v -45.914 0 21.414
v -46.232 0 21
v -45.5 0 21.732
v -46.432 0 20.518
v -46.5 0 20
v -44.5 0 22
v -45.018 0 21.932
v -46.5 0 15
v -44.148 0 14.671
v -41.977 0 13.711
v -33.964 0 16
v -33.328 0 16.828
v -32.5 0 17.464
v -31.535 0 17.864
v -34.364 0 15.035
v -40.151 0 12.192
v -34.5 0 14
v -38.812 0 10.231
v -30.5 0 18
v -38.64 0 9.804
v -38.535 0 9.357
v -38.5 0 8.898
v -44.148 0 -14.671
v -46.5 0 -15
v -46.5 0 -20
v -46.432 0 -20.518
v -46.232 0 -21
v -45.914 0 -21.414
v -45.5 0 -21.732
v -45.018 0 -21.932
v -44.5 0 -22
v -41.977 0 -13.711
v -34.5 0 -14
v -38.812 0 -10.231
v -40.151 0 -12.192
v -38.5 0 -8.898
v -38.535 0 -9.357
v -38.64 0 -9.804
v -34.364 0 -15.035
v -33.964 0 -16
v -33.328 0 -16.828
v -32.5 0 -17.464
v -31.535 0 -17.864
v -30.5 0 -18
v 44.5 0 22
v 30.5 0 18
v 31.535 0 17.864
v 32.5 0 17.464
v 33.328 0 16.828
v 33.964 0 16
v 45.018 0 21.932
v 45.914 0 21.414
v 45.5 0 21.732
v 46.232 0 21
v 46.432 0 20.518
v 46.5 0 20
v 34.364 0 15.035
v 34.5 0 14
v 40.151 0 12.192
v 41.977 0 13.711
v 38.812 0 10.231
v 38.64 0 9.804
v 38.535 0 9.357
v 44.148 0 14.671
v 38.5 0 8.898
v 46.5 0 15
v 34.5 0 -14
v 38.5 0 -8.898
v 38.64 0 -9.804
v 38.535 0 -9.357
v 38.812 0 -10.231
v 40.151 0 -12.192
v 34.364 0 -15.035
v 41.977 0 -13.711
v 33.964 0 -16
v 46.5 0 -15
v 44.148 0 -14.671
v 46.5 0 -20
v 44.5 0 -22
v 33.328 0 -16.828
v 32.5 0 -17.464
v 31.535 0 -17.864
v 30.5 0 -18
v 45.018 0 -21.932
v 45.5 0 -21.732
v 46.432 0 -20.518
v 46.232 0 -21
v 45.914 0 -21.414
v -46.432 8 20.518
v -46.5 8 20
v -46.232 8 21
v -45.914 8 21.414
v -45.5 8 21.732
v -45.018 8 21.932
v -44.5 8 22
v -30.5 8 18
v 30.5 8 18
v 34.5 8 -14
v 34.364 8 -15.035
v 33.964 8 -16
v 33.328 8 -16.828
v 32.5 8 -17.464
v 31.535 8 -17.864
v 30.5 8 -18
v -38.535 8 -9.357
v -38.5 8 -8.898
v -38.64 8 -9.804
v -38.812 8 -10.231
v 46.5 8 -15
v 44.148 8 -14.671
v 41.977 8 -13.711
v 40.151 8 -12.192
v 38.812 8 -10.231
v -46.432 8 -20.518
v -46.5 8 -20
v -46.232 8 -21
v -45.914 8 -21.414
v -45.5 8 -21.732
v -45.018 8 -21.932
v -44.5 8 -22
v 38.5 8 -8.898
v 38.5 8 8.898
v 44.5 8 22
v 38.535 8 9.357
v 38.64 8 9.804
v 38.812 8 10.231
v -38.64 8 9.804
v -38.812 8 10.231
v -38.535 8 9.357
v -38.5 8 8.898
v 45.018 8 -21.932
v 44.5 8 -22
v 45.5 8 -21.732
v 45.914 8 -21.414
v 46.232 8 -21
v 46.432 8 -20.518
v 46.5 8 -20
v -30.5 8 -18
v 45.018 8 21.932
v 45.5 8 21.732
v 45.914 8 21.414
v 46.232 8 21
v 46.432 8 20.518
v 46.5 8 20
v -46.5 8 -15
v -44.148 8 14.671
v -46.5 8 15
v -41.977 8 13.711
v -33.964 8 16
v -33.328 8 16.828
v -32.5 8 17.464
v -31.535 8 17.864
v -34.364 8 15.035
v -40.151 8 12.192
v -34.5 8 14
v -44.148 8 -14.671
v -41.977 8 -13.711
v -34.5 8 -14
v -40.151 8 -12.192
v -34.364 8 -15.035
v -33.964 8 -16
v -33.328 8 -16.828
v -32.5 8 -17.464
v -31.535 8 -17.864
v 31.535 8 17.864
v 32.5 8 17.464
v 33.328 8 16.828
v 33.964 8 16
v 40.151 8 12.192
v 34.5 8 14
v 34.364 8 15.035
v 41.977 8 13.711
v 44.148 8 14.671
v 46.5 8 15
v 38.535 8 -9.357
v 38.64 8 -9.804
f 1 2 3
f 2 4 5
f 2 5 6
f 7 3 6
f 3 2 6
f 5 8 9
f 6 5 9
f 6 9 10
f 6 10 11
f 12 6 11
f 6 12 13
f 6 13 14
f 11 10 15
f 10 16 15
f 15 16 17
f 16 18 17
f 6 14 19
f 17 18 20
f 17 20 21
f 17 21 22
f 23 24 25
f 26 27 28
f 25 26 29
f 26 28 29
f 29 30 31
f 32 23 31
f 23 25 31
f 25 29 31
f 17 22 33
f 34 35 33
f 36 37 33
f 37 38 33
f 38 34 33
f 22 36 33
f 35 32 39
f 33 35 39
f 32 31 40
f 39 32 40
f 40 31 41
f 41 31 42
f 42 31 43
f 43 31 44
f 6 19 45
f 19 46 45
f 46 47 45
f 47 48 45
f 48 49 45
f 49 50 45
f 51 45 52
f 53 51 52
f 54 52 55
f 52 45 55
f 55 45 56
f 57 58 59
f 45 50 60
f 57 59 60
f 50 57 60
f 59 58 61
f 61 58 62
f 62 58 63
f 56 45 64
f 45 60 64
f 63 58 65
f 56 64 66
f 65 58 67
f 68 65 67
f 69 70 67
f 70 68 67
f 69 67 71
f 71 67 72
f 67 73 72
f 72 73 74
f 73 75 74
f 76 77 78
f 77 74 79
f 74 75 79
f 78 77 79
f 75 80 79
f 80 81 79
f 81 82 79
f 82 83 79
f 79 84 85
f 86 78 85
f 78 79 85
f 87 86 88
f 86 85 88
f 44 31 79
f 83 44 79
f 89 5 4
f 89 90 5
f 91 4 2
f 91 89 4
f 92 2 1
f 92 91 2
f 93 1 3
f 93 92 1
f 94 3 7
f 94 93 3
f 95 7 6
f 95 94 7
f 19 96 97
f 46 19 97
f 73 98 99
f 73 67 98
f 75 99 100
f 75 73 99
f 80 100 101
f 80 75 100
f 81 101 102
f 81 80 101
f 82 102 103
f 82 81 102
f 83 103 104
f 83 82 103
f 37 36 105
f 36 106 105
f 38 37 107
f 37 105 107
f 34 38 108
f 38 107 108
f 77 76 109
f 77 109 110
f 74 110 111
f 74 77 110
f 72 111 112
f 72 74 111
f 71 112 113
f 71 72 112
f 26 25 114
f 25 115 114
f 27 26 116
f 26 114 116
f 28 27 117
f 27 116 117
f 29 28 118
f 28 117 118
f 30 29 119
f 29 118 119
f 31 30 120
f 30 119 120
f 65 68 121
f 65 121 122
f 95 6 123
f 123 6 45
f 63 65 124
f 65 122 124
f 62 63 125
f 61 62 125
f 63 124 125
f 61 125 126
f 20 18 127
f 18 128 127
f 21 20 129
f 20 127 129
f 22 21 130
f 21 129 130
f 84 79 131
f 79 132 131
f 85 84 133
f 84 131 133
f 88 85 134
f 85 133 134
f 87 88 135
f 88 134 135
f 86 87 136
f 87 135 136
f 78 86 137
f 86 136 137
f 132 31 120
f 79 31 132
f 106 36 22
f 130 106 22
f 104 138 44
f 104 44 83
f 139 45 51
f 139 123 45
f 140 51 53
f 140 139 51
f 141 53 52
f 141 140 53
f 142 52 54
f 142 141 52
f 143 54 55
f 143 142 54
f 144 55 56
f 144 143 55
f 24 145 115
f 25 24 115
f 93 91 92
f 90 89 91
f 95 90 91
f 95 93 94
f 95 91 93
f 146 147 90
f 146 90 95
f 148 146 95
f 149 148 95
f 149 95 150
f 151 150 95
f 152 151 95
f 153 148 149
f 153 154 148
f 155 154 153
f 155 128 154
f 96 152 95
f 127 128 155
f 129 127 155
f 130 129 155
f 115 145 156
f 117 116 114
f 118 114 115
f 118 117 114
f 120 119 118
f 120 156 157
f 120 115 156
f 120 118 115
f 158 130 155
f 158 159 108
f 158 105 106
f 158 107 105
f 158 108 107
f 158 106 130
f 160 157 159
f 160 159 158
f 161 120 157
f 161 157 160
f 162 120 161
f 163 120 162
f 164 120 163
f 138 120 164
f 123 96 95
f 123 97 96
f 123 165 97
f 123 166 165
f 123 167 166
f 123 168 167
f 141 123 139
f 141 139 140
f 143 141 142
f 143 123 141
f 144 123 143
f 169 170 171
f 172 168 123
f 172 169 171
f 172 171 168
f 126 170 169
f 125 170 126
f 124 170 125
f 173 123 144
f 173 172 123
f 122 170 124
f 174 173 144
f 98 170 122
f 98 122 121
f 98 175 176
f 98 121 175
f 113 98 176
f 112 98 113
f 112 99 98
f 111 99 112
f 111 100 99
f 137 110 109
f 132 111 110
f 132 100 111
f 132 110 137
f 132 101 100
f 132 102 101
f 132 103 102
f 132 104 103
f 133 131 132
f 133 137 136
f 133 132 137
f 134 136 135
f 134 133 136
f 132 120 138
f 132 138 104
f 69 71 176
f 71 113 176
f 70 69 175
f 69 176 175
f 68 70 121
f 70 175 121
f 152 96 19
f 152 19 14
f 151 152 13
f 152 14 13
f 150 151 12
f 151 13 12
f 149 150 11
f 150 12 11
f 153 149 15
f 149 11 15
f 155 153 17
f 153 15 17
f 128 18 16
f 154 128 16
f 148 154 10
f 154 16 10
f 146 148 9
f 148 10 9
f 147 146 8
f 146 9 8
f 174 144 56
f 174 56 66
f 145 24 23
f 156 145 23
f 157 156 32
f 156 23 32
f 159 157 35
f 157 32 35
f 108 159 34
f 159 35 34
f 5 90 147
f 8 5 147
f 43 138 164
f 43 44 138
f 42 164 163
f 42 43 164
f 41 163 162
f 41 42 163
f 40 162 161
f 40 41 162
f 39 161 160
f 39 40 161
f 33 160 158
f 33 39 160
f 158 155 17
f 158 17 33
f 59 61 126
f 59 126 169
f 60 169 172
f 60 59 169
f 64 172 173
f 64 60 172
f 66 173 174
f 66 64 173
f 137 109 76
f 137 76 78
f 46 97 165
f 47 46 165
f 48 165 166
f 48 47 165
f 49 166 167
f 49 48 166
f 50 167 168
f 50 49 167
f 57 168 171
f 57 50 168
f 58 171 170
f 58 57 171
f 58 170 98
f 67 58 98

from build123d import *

# Parameters (mm, degrees)
SKETCH1_W            = 93
SKETCH1_H            = 44
BOSS_EXTRUDE1_DEPTH  = 8
SKETCH2_W            = 69
SKETCH2_H            = 36
CUT_EXTRUDE1_DEPTH   = 8
FILLET1_R            = 4
FILLET2_R            = 2
CUT_EXTRUDE2_START   = -9
CUT_EXTRUDE2_DEPTH   = 10
FILLET3_R            = 3
FILLET3_OF_MIRROR1_R = 3


with BuildPart() as part:
    # Sketch1 → Boss-Extrude1 (new body)
    with BuildSketch(Plane(origin=(0, 0, 0), x_dir=(1, 0, 0), z_dir=(0, 1, 0))):
        Rectangle(SKETCH1_W, SKETCH1_H)
    extrude(amount=BOSS_EXTRUDE1_DEPTH)

    # Sketch2 → Cut-Extrude1 (cut)
    with BuildSketch(Plane(origin=(0, 8, 0), x_dir=(1, 0, 0), z_dir=(0, 1, 0))):
        Rectangle(SKETCH2_W, SKETCH2_H)
    extrude(amount=-CUT_EXTRUDE1_DEPTH, mode=Mode.SUBTRACT)

    # Fillet1
    fillet1_edges = [part.edges().sort_by_distance(p)[0] for p in [
        (34.5, 4, 18),
        (-34.5, 4, 18),
        (-34.5, 4, -18),
        (34.5, 4, -18),
    ]]
    fillet(fillet1_edges, radius=FILLET1_R)

    # Fillet2
    fillet2_edges = [part.edges().sort_by_distance(p)[0] for p in [
        (-46.5, 4, -22),
        (46.5, 4, -22),
        (46.5, 4, 22),
        (-46.5, 4, 22),
    ]]
    fillet(fillet2_edges, radius=FILLET2_R)

    # Sketch3 → Cut-Extrude2 (cut)
    with BuildSketch(Plane(origin=(0, 8, 0), x_dir=(1, 0, 0), z_dir=(0, 1, 0)).offset(CUT_EXTRUDE2_START)):
        with BuildLine():
            Line((-38.5, 9.522429027), (-38.5, -9.522429027))
            ThreePointArc((-38.5, -9.522429027), (-41.652222577, -13.499394615), (-46.5, -15))
            Line((-46.5, -15), (-46.5, 15))
            ThreePointArc((-46.5, 15), (-41.652222577, 13.499394615), (-38.5, 9.522429027))
        make_face()
    cut_extrude2 = extrude(amount=CUT_EXTRUDE2_DEPTH, mode=Mode.SUBTRACT)

    # Fillet3
    fillet3_edges = [part.edges().sort_by_distance(p)[0] for p in [
        (-38.5, 4, -9.522429027),
        (-38.5, 4, 9.522429027),
    ]]
    fillet(fillet3_edges, radius=FILLET3_R)

    # Mirror1: Cut-Extrude2 across plane
    add(cut_extrude2.mirror(Plane(origin=(0, 0, 0), x_dir=(0, 0, 1), z_dir=(1, 0, 0))), mode=Mode.SUBTRACT)

    # Fillet3 of Mirror1
    fillet3_of_mirror1_edges = [part.edges().sort_by_distance(p)[0] for p in [
        (38.5, 4, -9.522429027),
        (38.5, 4, 9.522429027),
    ]]
    fillet(fillet3_of_mirror1_edges, radius=FILLET3_OF_MIRROR1_R)


solid = part.part
